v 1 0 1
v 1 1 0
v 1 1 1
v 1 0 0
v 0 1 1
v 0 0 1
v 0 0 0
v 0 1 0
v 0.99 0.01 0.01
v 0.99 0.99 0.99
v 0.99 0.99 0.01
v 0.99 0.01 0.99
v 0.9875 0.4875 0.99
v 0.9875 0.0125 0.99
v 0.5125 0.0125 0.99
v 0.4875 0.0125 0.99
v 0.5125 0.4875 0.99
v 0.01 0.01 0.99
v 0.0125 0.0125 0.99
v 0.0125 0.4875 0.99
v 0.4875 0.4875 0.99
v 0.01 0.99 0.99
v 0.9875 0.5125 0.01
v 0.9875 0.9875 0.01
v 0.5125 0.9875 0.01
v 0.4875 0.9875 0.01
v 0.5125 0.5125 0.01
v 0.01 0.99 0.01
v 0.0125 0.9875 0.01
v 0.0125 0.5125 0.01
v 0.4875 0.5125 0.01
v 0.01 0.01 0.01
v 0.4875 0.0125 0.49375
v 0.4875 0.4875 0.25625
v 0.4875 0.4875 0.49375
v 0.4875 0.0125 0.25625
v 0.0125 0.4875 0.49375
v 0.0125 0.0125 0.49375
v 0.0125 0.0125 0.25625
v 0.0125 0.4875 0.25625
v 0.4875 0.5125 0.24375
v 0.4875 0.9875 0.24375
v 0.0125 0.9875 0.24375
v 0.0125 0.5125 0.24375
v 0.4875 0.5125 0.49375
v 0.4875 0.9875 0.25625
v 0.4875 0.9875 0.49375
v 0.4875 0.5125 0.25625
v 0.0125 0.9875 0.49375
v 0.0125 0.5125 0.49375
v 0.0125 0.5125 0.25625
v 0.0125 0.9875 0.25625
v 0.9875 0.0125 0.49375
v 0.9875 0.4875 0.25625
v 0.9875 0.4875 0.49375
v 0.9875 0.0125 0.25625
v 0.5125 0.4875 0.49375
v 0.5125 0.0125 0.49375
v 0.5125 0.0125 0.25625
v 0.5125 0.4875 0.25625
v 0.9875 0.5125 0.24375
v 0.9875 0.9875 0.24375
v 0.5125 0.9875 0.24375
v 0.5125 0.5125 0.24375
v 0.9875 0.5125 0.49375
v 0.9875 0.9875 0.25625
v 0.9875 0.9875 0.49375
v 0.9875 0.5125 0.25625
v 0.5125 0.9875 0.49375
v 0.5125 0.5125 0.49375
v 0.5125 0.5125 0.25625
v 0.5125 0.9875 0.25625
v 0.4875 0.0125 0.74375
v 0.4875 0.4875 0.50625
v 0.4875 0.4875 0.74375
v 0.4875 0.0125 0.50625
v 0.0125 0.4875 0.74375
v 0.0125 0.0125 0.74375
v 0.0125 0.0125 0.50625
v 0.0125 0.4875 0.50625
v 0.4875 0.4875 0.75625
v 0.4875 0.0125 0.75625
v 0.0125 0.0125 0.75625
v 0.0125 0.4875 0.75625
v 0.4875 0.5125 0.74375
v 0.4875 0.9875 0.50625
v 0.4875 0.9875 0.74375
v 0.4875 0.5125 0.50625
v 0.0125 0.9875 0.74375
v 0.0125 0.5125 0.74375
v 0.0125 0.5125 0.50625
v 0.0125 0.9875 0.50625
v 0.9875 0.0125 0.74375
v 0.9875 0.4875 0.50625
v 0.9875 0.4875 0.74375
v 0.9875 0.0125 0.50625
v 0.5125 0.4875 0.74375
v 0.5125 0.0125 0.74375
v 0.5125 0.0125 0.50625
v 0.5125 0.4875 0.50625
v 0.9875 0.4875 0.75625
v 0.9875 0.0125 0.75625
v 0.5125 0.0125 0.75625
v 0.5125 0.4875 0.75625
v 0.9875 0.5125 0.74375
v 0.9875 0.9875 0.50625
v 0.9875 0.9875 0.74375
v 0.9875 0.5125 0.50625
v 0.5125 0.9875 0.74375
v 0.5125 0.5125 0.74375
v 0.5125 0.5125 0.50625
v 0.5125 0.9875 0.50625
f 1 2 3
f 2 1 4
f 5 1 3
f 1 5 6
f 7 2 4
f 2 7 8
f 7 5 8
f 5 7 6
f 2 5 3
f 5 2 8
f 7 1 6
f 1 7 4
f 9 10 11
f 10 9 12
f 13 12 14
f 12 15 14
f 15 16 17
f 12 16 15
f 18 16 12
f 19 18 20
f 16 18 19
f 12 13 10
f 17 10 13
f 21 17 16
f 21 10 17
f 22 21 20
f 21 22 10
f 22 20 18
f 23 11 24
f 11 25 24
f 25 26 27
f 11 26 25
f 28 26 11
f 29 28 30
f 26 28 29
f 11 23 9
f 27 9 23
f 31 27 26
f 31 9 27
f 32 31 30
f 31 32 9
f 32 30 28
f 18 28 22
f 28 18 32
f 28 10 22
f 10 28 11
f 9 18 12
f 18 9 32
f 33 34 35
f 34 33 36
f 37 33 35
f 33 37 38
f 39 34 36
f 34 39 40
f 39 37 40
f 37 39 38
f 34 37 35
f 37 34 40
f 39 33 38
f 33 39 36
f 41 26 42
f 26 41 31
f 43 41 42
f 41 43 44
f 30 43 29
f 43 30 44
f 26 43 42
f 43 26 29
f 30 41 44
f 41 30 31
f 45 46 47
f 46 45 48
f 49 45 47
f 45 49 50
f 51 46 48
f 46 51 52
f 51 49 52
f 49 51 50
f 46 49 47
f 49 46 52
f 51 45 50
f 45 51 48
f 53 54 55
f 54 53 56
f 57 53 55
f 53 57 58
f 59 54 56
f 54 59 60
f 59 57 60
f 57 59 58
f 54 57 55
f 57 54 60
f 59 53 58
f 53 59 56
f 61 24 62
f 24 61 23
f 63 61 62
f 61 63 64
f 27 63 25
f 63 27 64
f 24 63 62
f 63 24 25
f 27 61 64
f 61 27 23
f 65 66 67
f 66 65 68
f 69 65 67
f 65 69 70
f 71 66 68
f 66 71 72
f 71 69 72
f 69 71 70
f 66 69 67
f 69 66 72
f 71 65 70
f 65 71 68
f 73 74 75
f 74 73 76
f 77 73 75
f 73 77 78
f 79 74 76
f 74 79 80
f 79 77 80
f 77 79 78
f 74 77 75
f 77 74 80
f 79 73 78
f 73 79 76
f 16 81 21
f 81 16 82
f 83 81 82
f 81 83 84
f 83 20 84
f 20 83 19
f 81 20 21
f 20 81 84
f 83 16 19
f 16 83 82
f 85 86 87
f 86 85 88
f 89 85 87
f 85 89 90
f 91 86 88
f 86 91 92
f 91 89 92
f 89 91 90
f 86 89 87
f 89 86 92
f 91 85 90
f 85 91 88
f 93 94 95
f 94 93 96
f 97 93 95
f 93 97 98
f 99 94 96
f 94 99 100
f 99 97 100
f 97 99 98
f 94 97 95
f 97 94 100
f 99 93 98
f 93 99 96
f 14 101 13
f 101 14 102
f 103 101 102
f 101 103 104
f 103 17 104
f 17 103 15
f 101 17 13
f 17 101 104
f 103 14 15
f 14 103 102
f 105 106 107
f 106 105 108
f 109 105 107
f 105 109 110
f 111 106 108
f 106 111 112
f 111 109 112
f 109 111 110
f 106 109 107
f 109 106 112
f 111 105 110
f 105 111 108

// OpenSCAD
translate([0.25, 0.25, 0.375]) color([0.21709076393122206, 0.4979948584580751, 0.6176241526046676]) cube([0.475, 0.475, 0.2375], center=true);
translate([0.25, 0.75, 0.125]) color([0.4722249532281336, 0.7228331534363125, 0.6109414561657331]) cube([0.475, 0.475, 0.2375], center=true);
translate([0.25, 0.75, 0.375]) color([0.5330085163671737, 0.6769359871291822, 0.5973748769978083]) cube([0.475, 0.475, 0.2375], center=true);
translate([0.75, 0.25, 0.375]) color([0.14460255854654236, 0.21273280877313017, 0.8417179364881341]) cube([0.475, 0.475, 0.2375], center=true);
translate([0.75, 0.75, 0.125]) color([0.6300391880279899, 0.5103677782275869, 0.4479627161837708]) cube([0.475, 0.475, 0.2375], center=true);
translate([0.75, 0.75, 0.375]) color([0.2903518628620462, 0.1744676713524972, 0.5457372127765215]) cube([0.475, 0.475, 0.2375], center=true);
translate([0.25, 0.25, 0.625]) color([0.6340658375422632, 0.7004271366493812, 0.690956934786038]) cube([0.475, 0.475, 0.2375], center=true);
translate([0.25, 0.25, 0.875]) color([0.013948469234104865, 0.8018456354370093, 0.2607079205191076]) cube([0.475, 0.475, 0.2375], center=true);
translate([0.25, 0.75, 0.625]) color([0.01899716010339858, 0.7507132946374245, 0.44168653561511173]) cube([0.475, 0.475, 0.2375], center=true);
translate([0.75, 0.25, 0.625]) color([0.1668653701245908, 0.45955837321901094, 0.7876756969907556]) cube([0.475, 0.475, 0.2375], center=true);
translate([0.75, 0.25, 0.875]) color([0.09564527702692727, 0.06733136152719421, 0.7816649665975636]) cube([0.475, 0.475, 0.2375], center=true);
translate([0.75, 0.75, 0.625]) color([0.030385075649315252, 0.33346286891595733, 0.08647112242809318]) cube([0.475, 0.475, 0.2375], center=true);
color([0.3,0.3,0.3,0.3]) difference() { cube([1,1,1]); translate([0.01,0.01,0.01]) cube([0.98,0.98,0.98]); }
